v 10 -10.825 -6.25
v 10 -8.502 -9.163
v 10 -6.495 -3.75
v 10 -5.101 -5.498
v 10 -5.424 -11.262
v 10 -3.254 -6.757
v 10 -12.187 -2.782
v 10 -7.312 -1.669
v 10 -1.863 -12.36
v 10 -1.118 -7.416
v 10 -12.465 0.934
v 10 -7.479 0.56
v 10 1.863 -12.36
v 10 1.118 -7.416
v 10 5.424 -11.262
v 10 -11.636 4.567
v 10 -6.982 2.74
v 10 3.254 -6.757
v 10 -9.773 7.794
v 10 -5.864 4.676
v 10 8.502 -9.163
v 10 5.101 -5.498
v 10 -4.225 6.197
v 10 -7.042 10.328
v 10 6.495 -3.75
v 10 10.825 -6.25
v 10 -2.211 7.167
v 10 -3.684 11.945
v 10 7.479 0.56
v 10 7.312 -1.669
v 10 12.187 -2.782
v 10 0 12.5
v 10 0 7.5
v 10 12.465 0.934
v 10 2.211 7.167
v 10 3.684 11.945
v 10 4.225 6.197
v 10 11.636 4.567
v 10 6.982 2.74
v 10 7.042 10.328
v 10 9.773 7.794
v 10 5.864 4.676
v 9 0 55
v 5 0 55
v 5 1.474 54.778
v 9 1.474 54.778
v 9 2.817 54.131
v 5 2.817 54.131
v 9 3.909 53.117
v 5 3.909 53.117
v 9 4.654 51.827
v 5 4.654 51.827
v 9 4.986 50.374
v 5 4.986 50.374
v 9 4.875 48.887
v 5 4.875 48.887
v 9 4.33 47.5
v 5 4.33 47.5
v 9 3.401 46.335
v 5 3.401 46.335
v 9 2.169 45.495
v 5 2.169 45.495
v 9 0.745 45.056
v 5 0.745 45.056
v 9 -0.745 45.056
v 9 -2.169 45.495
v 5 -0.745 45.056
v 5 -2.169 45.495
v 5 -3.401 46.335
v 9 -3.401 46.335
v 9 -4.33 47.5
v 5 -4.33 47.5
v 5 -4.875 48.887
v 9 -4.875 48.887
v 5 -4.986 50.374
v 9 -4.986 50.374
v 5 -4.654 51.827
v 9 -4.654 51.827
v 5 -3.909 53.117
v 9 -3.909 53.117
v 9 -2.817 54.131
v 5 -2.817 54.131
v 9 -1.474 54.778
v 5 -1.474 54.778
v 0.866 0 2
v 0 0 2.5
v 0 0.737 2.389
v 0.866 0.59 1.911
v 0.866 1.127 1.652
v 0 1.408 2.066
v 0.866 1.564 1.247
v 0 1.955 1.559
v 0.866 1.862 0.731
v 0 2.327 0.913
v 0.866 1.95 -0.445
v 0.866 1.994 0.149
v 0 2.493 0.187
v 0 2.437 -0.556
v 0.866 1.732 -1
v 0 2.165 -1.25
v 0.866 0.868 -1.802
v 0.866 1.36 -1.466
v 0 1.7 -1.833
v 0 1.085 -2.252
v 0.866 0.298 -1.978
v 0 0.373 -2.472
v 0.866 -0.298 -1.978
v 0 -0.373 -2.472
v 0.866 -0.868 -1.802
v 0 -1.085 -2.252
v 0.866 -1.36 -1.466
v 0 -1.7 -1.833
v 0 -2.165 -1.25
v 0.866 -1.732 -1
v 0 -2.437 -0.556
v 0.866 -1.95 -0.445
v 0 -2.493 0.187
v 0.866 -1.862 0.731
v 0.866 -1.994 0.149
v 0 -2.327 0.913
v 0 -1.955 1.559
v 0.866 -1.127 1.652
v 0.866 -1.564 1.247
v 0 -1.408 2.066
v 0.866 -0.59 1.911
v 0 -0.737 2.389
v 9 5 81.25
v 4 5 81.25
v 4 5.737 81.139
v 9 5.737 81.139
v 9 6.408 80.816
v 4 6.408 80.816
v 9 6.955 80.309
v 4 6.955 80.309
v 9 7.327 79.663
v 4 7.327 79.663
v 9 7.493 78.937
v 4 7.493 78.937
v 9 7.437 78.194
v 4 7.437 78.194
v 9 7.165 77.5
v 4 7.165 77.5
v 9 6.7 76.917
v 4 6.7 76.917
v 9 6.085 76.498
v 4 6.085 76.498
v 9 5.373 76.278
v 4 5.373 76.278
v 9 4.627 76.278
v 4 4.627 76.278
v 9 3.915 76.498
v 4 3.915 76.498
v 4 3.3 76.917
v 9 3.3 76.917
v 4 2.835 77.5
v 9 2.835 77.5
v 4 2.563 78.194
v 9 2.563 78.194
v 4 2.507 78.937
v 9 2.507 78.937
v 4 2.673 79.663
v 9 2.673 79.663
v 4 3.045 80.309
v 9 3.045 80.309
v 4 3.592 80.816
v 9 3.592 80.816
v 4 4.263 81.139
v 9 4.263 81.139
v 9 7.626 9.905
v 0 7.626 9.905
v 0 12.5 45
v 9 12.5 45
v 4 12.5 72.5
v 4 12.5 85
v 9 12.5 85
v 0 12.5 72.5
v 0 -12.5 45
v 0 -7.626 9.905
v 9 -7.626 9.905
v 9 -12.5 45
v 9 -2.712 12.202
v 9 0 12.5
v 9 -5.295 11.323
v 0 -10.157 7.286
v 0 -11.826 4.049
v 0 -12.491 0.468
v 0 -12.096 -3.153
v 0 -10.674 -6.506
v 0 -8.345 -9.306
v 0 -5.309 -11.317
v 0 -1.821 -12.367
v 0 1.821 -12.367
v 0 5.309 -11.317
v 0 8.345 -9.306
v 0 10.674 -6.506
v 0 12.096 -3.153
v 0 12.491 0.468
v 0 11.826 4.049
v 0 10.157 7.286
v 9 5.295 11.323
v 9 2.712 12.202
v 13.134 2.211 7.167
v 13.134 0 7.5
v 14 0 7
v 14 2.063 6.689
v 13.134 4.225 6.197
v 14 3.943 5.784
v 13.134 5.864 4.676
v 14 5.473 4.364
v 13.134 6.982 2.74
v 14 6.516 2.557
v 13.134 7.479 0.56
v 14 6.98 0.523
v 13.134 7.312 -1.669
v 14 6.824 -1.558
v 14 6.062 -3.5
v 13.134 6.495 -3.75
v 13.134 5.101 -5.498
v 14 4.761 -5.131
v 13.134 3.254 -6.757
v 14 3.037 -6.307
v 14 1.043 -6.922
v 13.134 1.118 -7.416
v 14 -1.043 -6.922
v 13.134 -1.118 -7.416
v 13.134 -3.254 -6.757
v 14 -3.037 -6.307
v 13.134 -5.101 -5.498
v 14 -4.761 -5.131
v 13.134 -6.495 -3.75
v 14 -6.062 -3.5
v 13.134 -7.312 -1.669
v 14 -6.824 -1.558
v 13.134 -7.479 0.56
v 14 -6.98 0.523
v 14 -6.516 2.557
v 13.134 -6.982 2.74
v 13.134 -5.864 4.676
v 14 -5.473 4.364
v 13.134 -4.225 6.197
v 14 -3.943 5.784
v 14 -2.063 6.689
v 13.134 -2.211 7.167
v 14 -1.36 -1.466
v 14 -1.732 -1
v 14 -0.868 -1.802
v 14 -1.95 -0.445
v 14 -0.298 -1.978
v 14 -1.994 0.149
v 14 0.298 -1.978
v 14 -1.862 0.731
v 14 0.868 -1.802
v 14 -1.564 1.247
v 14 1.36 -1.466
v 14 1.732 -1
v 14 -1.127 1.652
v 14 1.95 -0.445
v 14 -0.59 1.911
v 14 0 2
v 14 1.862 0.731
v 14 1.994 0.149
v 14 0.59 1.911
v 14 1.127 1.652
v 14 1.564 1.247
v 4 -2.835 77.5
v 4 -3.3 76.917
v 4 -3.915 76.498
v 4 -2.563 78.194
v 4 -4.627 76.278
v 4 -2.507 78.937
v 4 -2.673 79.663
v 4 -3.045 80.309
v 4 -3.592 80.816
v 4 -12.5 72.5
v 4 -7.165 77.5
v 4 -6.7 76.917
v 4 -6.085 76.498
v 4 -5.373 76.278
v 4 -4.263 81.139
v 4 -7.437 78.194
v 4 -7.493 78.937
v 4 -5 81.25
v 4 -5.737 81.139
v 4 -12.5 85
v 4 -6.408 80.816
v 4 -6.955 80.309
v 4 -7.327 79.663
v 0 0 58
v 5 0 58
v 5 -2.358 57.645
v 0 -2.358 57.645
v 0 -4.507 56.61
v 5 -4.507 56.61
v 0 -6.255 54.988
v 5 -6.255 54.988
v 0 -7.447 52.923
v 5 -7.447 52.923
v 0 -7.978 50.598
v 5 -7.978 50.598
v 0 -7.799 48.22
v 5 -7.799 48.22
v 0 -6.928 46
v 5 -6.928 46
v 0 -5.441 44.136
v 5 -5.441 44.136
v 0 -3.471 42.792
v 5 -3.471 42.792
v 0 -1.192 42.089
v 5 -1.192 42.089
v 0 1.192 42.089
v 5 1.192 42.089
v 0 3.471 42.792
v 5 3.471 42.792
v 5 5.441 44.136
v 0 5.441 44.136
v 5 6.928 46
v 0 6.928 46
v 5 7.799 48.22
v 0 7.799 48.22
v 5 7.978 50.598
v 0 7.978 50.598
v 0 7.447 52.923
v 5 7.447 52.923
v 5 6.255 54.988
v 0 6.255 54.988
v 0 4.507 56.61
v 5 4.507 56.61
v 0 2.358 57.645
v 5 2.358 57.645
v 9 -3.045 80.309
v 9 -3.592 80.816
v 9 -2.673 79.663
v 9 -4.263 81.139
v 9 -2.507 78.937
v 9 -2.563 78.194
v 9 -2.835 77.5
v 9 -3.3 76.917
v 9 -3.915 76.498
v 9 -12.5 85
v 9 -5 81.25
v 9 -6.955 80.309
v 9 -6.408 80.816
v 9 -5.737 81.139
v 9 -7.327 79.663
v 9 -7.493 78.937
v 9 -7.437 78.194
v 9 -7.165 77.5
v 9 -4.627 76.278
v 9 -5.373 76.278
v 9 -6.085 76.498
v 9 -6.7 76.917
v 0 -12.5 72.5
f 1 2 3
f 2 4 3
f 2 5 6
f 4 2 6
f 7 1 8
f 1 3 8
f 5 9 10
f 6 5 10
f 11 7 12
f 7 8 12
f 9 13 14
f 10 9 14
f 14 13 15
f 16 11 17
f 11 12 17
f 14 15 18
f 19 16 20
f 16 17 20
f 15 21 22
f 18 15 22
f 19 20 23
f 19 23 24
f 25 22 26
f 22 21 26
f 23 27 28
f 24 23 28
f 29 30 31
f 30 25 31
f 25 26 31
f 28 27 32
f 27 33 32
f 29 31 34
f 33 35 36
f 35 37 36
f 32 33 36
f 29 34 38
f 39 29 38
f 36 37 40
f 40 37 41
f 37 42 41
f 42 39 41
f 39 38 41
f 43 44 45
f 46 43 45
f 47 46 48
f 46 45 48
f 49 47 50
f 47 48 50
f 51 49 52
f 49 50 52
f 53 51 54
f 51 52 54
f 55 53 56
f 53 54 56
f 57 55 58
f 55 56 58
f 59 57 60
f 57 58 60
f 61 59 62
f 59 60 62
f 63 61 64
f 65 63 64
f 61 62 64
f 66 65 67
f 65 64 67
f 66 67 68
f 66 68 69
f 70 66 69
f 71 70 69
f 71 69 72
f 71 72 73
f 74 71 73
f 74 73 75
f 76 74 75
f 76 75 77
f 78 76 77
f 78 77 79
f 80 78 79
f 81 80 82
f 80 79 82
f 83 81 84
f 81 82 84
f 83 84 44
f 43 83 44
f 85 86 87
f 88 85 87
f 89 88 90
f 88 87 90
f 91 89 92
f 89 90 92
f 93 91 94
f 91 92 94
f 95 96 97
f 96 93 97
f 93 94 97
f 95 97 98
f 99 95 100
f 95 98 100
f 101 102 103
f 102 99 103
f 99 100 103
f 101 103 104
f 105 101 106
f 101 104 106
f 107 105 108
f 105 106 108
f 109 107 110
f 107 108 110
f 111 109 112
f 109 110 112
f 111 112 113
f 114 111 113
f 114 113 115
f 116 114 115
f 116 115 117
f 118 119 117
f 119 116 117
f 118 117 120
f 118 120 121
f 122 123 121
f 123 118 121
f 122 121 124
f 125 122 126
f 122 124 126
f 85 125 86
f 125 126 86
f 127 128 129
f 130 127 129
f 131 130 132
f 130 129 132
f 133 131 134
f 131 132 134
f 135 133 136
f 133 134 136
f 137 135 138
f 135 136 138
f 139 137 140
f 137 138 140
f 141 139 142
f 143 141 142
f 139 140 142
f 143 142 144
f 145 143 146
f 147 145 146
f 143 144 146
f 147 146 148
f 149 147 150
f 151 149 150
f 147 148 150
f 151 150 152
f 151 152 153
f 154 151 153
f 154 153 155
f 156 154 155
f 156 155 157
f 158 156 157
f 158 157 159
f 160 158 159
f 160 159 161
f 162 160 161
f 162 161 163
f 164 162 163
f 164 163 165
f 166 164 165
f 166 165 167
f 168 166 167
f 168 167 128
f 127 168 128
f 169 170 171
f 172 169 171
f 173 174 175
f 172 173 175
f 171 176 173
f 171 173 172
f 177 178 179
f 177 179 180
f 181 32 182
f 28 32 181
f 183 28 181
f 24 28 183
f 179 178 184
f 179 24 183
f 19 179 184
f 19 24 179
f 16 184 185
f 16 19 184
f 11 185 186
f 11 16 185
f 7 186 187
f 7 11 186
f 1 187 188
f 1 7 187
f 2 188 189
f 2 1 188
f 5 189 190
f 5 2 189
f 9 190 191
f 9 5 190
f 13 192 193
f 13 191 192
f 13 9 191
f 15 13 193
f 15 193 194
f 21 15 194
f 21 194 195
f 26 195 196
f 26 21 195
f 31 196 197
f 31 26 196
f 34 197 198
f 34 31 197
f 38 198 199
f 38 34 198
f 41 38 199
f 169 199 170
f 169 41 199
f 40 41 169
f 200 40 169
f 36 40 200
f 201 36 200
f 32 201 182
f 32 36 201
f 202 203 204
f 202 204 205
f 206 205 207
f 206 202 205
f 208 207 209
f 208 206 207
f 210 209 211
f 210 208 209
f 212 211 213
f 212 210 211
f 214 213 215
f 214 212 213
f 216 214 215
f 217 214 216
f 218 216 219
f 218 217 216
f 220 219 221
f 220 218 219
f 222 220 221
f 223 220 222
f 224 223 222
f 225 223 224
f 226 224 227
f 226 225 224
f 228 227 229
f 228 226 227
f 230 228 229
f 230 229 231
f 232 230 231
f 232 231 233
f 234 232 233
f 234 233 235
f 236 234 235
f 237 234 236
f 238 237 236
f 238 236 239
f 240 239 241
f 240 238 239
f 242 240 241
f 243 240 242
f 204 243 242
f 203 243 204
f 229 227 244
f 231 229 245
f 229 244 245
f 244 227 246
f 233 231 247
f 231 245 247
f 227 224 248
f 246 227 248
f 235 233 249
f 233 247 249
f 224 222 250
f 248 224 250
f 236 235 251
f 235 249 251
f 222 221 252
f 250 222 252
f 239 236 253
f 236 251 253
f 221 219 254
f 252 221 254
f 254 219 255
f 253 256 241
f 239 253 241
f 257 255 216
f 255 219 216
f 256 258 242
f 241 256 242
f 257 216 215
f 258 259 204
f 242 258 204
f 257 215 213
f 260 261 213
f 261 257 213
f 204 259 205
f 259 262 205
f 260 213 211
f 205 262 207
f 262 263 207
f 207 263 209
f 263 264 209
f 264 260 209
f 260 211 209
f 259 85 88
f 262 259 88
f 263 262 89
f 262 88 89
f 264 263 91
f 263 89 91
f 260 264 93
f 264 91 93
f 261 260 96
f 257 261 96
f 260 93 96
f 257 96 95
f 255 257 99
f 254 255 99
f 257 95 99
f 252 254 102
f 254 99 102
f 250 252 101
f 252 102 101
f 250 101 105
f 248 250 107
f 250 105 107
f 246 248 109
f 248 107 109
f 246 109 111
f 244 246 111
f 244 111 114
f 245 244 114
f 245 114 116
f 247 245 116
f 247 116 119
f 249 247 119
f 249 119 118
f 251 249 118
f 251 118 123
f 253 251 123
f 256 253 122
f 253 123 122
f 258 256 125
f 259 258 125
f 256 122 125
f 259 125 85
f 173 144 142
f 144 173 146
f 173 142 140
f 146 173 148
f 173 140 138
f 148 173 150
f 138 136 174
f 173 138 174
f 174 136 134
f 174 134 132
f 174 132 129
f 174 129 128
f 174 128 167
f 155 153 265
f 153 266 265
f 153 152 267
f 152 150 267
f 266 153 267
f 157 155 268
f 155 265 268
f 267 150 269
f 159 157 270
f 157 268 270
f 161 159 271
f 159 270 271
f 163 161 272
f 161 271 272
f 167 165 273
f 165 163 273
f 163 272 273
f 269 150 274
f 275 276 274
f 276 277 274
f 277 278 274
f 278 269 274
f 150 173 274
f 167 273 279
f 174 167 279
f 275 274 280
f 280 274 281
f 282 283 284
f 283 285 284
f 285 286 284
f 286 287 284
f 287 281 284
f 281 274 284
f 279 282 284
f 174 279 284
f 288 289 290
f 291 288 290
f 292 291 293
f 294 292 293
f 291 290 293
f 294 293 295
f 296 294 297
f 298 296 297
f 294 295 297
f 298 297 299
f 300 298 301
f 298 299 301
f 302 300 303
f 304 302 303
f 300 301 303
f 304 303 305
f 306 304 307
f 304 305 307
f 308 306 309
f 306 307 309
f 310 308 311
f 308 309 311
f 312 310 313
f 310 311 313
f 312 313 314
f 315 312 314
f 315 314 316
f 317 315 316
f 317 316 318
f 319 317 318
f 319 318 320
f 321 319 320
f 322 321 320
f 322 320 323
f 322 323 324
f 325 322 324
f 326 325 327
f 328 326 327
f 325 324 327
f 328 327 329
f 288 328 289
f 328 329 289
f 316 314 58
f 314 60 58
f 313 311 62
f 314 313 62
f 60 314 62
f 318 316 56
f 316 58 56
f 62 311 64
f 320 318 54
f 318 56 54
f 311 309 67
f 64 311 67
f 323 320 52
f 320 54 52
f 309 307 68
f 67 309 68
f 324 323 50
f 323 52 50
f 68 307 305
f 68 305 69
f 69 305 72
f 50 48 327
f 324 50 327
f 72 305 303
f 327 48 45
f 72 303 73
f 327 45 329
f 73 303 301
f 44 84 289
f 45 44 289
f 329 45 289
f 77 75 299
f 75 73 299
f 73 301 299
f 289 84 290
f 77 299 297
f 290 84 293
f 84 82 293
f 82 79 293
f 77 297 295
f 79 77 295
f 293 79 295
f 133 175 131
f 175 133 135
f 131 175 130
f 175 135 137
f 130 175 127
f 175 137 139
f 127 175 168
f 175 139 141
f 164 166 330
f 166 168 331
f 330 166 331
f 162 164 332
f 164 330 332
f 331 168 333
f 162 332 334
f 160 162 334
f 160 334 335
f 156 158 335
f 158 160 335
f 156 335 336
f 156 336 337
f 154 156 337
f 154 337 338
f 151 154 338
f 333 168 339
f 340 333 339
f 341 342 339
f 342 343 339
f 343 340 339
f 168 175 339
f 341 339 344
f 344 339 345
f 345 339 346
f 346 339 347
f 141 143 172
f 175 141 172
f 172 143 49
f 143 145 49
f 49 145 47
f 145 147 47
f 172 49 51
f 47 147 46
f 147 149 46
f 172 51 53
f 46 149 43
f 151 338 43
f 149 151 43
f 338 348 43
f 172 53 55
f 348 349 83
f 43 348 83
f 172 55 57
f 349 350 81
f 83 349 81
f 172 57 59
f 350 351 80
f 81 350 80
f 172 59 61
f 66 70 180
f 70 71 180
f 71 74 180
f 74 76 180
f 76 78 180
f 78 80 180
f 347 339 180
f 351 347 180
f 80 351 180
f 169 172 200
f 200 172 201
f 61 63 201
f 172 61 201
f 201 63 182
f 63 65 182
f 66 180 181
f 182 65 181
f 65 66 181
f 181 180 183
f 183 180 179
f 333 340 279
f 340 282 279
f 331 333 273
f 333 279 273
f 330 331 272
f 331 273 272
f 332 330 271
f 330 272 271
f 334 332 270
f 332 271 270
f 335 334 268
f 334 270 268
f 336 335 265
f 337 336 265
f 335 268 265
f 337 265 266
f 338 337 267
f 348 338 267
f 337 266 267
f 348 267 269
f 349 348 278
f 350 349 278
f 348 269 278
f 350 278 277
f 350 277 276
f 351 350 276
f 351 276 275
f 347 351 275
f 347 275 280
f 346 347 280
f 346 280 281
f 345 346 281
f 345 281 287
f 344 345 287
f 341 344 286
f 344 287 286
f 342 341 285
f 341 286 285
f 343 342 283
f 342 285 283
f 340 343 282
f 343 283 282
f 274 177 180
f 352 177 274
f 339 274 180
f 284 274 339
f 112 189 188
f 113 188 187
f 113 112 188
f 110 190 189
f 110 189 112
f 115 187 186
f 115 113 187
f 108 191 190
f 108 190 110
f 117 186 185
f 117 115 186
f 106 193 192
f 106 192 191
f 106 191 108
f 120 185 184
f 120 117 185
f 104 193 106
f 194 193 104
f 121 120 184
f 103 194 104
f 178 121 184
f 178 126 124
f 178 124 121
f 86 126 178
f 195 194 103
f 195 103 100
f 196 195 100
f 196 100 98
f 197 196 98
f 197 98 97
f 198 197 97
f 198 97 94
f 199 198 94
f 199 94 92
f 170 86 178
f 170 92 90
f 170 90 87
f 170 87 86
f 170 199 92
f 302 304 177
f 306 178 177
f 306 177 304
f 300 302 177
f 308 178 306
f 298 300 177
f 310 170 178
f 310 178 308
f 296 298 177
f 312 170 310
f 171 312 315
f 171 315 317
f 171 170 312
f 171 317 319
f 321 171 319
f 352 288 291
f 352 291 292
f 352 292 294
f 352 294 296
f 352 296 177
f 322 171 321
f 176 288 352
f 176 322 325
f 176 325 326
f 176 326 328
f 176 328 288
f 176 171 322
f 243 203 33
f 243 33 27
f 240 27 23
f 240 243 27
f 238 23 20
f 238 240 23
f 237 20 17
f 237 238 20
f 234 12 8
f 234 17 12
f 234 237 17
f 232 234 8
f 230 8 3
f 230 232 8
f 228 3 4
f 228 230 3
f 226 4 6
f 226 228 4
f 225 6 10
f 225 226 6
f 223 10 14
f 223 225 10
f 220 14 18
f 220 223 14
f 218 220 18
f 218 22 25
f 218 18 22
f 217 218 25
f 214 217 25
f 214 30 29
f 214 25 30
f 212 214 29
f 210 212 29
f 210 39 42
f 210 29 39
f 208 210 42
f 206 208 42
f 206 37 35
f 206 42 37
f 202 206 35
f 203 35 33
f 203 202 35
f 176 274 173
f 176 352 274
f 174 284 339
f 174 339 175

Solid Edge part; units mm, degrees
sketch "Sketch1" plane through (0, 0, 0) normal (0, -1, 0) x (1, 0, 0)
  line L0 (0, 0) -> (0, 12.5)
  line L1 (0, 12.5) -> (10, 12.5)
  line L2 (10, 12.5) -> (10, 7.5)
  line L3 (10, 7.5) -> (14, 7.5)
  line L4 (14, 7.5) -> (14, 0)
  dimension "D1" = 4
  dimension "D2" = 10
revolve "RevolvedProtrusion1" add sketch "Sketch1" angle 360 about axis through (13.3633, 0, 0) along (-1, 0, 0)
sketch "Sketch2" plane through (0, 0, 0) normal (1, 0, 0) x (0, 1, 0)
  line L0 (12.5, 85) -> (12.5, 45)
  line L1 (6.25, 0) -> (12.5, 45)
  line L2 (-6.25, 0) -> (6.25, 0)
  line L3 (-6.25, 0) -> (-12.5, 45)
  line L4 (-12.5, 45) -> (-12.5, 85)
  line L5 (-12.5, 85) -> (12.5, 85)
  dimension "D1" = 25
  dimension "D2" = 12.5
  dimension "D3" = 40
  dimension "D4" = 85
extrude "Protrusion1" add sketch "Sketch2" along normal blind 9
hole "Hole_1" at (0, 0, 0) direction (1, 0, 0) diameter 4 end up to next
chamfer "Chamfer_1" distance 0.5 angle 60 1 edges at (14, 0, -7.5) measured on face at (14, -4.85, -5.15)
sketch "Sketch3" plane through (0, 0, 36.25) normal (-1, 0, 0) x (0, 0, 1)
  line L0 (48.75, 12.5) -> (48.75, -12.5)
  line L1 (48.75, -12.5) -> (36.25, -12.5)
  line L2 (36.25, -12.5) -> (36.25, 12.5)
  line L3 (36.25, 12.5) -> (48.75, 12.5)
  dimension "D1" = 12.5
extrude "ExtrudedCutout_1" cut sketch "Sketch3" against normal blind 4
hole "Hole_2" at (4, 5, 78.75) direction (1, 0, 0) diameter 5 end up to next
hole "Hole1" at (4, -5, 78.75) direction (1, 0, 0) diameter 5 end up to next
chamfer "Chamfer_2" distance 0.5 angle 60 1 edges at (0, 0, -2) measured on face at (0, -8.0833, 59.1833)
hole "Hole_4" at (0, 0, 50) direction (1, 0, 0) diameter 10 end up to next counterbore diameter 16 counterbore depth 5
properties material "Polyethylene, low density"
